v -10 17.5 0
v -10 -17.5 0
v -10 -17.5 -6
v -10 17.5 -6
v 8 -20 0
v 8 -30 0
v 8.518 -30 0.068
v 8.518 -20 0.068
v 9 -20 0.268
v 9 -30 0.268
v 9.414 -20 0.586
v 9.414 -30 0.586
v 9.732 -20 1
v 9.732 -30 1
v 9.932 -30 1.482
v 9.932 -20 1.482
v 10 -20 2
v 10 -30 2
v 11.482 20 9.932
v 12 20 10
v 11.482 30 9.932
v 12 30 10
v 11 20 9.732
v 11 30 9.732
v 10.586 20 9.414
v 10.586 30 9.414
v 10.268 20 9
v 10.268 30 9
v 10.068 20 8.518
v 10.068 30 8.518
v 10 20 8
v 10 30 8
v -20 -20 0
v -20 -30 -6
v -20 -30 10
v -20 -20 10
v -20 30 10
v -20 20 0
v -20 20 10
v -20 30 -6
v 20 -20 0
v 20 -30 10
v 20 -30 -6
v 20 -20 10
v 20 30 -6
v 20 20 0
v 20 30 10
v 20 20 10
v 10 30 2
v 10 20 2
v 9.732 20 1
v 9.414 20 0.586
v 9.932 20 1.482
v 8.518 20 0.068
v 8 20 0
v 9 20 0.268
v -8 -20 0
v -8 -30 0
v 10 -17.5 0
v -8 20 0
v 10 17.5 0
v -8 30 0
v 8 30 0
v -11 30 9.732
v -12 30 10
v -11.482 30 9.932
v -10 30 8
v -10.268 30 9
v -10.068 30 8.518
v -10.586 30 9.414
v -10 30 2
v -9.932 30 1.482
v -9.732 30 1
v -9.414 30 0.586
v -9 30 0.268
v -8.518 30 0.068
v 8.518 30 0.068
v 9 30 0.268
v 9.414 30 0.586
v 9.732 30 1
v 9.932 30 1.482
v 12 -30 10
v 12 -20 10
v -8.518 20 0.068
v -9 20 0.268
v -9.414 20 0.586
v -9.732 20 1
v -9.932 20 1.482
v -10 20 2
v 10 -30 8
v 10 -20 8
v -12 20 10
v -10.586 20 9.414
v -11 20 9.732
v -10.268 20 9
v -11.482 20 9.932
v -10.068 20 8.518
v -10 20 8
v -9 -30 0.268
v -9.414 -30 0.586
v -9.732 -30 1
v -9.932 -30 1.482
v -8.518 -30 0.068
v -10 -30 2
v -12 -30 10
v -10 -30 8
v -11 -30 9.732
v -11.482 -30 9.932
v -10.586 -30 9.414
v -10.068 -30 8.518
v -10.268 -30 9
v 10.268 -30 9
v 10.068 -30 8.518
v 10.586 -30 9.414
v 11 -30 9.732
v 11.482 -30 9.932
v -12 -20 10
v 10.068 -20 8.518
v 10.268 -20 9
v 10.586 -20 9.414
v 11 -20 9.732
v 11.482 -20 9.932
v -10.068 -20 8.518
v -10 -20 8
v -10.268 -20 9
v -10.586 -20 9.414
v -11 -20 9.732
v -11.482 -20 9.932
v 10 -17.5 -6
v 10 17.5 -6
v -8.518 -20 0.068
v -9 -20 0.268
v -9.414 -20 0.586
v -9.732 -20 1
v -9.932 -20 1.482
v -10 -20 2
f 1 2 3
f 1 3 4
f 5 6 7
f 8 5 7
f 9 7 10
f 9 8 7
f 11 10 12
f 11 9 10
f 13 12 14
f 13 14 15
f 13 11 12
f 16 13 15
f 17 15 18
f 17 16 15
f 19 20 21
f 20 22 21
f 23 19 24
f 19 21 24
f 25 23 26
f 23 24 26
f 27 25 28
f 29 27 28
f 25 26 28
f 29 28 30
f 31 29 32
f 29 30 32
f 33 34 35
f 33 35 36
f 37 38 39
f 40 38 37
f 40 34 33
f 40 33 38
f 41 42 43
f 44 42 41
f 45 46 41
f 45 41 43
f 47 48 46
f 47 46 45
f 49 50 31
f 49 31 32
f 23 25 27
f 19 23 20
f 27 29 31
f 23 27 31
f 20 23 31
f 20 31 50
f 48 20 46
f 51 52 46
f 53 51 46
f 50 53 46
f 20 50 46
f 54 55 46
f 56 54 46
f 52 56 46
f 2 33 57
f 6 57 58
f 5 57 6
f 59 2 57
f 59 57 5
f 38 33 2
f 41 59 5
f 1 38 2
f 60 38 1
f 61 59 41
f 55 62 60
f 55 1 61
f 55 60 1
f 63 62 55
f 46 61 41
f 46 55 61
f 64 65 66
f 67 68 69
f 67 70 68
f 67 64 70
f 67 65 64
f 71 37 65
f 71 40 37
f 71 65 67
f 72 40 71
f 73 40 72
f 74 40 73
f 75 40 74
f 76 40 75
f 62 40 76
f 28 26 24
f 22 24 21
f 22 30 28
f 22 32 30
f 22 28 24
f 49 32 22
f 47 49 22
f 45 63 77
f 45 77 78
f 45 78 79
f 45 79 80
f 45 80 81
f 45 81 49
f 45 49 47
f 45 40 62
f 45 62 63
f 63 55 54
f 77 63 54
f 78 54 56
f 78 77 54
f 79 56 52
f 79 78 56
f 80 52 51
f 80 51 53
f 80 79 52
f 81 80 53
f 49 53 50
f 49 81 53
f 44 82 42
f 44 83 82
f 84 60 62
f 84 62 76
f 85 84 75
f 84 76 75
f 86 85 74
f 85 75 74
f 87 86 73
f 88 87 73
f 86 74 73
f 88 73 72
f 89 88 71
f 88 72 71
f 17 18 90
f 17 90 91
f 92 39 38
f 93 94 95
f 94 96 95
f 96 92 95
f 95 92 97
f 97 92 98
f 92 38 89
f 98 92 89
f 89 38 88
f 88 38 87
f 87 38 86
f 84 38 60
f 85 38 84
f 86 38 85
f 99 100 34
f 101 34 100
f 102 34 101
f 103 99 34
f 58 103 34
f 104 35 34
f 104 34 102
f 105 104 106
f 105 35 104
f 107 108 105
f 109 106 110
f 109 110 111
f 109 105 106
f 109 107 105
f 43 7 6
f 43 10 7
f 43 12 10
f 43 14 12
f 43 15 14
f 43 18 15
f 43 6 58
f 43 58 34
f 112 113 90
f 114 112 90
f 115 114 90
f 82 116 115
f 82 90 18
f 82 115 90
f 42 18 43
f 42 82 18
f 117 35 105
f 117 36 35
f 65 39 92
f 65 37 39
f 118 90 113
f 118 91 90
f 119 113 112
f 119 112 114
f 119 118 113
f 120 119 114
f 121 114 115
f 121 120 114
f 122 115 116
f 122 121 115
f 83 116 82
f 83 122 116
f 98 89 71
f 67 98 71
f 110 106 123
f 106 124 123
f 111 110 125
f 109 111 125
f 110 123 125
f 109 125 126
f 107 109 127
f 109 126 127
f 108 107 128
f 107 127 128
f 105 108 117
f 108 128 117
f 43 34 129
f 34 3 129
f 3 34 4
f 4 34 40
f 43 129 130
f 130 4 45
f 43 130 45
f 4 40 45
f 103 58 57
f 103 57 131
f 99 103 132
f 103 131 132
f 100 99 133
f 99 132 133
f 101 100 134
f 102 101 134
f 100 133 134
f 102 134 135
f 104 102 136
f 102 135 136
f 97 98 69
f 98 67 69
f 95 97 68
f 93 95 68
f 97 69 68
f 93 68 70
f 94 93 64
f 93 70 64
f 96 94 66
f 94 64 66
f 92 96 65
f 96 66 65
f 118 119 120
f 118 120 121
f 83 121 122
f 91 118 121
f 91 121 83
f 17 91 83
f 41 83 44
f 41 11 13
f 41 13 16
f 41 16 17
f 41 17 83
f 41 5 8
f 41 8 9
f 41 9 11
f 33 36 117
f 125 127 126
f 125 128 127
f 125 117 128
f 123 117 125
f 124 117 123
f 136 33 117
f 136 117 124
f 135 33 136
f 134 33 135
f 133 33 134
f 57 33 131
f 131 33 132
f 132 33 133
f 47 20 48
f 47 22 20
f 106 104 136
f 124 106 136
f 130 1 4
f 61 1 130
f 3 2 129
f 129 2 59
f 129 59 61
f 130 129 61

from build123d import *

# Parameters (mm, degrees)
F0_W      = 40
F0_H      = 60
F1_DEPTH  = 6
F2_W      = 10
F2_H      = 10
F3_DEPTH  = 10
F13_R     = 2
F14_W     = 20
F14_H     = 35
F15_DEPTH = 25


# Not quite as in the source:
# - the program builds the solid bodies; features that only make, move or delete a surface that nothing else refers to are left out


with BuildPart() as f1:
    # F0 (on Top) → F1 (new body)
    with BuildSketch(Plane.XY):
        Rectangle(F0_W, F0_H)
    extrude(amount=-F1_DEPTH)

    # F2 (on face) → F3 (join)
    with BuildSketch(Plane.XY):
        with Locations((-15, 25)):
            Rectangle(F2_W, F2_H)
        with Locations((15, 25)):
            Rectangle(F2_W, F2_H)
        with Locations((15, -25)):
            Rectangle(F2_W, F2_H)
        with Locations((-15, -25)):
            Rectangle(F2_W, F2_H)
    extrude(amount=F3_DEPTH)

    # F13
    f13_edges = [f1.edges().sort_by_distance(p)[0] for p in [
        (-10, 25, 10),
        (-10, -25, 10),
        (-10, -25, 0),
        (-10, 25, 0),
        (10, -25, 10),
        (10, 25, 10),
        (10, -25, 0),
        (10, 25, 0),
    ]]
    fillet(f13_edges, radius=F13_R)

    # F14 (on face) → F15 (cut)
    with BuildSketch(Plane.XY):
        Rectangle(F14_W, F14_H)
    extrude(amount=-F15_DEPTH, mode=Mode.SUBTRACT)


solid = f1.part
